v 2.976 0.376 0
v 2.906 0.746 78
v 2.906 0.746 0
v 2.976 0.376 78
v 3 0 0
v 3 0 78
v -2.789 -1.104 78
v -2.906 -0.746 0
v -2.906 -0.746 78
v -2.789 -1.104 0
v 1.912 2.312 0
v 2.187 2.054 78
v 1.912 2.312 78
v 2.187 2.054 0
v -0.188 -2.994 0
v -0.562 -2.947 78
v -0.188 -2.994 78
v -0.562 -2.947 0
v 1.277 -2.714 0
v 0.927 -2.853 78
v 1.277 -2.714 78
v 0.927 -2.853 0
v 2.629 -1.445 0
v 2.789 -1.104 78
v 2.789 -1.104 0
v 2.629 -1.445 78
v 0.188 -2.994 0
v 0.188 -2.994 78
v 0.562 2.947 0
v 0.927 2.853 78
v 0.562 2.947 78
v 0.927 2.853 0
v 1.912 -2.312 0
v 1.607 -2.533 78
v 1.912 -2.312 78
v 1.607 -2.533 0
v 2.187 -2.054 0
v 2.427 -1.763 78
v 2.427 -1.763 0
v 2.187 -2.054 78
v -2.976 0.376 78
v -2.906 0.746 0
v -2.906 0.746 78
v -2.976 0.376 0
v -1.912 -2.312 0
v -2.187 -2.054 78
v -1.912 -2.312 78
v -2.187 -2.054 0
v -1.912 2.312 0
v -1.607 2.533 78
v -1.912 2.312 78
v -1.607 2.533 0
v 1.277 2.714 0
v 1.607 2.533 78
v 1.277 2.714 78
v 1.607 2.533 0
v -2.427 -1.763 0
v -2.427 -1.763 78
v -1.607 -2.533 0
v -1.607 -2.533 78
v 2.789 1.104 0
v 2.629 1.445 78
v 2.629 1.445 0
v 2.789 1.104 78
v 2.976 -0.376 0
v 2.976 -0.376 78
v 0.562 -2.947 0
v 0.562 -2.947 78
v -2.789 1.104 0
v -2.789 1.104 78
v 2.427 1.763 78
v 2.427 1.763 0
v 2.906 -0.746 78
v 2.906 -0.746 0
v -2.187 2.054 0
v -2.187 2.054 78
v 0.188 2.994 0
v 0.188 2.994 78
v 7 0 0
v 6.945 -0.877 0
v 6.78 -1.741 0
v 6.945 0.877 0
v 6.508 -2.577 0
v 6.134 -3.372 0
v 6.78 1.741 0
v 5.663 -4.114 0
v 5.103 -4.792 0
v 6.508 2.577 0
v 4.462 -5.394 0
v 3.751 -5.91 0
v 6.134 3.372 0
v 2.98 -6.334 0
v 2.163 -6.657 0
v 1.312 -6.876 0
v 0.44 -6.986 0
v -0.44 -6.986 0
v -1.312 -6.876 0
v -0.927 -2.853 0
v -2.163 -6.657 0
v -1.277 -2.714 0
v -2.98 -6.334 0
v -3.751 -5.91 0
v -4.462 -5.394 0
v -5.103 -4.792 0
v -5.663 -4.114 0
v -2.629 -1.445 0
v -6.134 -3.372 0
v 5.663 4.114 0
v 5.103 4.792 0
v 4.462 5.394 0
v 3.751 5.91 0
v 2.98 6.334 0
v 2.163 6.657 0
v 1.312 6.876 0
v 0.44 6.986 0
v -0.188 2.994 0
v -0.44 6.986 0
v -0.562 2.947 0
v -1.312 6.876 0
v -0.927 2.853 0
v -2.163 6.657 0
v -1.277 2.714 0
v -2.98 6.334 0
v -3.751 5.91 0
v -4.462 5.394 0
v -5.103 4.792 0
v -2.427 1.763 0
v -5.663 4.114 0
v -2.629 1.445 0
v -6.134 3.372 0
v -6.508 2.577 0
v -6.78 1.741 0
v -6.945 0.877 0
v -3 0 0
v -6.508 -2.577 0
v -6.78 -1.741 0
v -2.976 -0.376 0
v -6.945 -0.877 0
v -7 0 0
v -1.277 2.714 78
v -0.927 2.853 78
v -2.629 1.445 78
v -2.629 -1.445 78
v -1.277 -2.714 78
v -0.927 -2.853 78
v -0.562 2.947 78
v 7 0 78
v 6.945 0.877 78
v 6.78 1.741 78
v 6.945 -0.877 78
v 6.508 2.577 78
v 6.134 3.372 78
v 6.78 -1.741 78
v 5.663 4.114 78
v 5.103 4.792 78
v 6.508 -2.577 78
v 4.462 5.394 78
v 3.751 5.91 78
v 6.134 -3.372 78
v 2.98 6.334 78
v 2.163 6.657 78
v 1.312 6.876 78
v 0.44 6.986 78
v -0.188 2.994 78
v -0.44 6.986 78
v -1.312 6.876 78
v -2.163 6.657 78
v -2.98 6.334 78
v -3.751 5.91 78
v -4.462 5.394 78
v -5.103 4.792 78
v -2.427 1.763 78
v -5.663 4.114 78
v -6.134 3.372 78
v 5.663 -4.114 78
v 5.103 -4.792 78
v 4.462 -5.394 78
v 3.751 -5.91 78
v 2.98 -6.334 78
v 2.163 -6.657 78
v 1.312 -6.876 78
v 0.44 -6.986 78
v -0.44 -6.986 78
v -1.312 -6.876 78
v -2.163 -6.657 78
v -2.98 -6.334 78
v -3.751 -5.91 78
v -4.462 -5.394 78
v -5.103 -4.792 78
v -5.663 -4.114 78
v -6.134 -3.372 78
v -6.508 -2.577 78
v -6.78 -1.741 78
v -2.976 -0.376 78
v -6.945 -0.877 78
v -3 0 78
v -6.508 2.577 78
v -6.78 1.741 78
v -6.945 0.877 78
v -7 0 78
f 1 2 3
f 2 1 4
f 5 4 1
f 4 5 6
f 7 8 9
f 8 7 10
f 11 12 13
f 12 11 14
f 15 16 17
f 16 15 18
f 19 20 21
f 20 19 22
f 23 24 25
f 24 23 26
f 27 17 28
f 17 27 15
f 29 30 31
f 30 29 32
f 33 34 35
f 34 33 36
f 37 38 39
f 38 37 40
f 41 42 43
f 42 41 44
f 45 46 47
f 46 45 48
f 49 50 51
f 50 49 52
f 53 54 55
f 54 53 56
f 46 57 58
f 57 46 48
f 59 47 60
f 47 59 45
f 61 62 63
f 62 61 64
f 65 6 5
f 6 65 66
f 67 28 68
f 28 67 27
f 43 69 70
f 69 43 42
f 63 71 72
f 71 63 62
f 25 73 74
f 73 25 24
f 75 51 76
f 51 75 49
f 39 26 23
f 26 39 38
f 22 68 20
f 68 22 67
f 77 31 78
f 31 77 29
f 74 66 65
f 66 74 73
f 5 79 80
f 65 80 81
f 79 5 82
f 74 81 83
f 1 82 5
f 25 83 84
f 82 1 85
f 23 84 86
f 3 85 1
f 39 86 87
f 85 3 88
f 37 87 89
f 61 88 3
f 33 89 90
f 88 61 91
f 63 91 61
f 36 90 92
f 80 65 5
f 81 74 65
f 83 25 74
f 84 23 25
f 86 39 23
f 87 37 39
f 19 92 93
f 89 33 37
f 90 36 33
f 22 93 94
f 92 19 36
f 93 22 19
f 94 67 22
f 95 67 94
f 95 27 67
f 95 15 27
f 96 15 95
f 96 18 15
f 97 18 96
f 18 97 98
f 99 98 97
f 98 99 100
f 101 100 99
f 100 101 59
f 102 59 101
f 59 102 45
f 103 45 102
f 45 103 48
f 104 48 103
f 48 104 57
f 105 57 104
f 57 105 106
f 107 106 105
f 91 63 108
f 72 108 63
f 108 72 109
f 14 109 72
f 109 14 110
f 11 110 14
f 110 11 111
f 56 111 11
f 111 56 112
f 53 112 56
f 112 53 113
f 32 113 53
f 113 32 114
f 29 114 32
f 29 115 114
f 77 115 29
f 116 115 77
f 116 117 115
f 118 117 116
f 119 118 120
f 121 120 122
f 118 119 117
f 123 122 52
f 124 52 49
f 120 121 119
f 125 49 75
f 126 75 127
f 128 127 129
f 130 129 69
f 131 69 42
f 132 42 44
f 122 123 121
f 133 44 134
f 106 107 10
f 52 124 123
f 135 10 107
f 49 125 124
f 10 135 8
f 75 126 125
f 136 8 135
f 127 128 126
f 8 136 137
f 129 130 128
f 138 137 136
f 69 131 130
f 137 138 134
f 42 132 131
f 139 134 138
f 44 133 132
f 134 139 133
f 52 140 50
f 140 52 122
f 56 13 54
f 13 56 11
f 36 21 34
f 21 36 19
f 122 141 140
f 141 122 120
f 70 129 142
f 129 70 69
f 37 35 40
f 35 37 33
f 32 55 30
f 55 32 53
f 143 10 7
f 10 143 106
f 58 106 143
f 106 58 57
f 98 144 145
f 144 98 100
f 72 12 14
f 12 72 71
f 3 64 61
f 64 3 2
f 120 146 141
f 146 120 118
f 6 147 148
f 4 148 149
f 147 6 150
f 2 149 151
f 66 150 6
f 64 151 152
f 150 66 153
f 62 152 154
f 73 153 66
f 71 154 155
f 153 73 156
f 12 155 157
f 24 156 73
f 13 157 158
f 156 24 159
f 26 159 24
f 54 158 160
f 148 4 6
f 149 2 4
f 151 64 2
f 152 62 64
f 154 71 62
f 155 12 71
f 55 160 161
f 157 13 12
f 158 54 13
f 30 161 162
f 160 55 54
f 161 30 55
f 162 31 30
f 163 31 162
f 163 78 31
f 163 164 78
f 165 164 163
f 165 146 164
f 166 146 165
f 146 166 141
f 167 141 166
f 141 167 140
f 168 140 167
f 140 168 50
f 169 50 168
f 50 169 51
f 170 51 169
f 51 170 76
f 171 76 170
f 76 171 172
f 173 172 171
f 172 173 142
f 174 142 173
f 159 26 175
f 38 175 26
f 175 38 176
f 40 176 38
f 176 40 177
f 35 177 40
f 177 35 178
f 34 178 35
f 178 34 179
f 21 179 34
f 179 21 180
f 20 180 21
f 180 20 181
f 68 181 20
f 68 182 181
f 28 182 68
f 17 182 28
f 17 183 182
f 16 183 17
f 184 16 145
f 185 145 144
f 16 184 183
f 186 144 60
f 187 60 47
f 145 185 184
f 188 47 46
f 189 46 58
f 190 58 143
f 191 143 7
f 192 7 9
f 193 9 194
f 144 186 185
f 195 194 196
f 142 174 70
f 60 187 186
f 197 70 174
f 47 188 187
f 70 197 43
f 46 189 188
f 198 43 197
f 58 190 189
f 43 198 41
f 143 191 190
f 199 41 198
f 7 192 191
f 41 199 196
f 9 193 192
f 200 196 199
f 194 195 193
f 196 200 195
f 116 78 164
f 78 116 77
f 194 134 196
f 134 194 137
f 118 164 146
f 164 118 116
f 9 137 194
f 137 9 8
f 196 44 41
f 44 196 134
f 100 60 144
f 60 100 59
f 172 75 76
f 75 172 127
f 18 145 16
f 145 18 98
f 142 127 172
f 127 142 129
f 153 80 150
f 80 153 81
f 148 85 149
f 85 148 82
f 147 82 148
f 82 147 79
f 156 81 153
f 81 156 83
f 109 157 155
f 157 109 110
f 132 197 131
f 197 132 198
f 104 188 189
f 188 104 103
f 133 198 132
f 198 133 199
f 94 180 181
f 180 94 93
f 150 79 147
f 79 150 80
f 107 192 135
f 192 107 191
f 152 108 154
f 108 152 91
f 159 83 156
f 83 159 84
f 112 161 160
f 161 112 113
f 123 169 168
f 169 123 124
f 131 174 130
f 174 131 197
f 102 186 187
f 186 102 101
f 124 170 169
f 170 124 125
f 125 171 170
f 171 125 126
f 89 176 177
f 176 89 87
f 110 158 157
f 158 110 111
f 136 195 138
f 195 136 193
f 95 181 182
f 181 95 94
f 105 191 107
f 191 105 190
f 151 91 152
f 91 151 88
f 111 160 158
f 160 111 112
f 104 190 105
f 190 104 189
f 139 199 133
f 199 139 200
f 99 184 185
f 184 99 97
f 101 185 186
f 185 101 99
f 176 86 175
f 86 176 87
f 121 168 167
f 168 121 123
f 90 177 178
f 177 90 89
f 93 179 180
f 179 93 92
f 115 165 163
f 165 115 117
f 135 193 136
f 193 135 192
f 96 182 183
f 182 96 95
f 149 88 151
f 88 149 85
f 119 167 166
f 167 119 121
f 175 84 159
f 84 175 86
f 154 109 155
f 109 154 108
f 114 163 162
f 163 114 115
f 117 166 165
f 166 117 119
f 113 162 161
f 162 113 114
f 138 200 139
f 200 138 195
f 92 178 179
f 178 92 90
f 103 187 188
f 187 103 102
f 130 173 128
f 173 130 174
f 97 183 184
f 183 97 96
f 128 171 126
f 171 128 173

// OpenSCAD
$fn = 50;


difference() {
	union() {
		cylinder(h = 78, r = 7.0000000000);
	}
	union() {
		cylinder(h = 78, r = 3.0000000000);
		cylinder(h = 78, r = 3.0000000000);
		cylinder(h = 78, r = 1.5000000000);
		cylinder(h = 78, r = 1.5000000000);
		cylinder(h = 78, r = 1.5000000000);
		cylinder(h = 78, r = 1.5000000000);
		cylinder(h = 78, r = 1.5000000000);
		cylinder(h = 78, r = 1.5000000000);
	}
}
